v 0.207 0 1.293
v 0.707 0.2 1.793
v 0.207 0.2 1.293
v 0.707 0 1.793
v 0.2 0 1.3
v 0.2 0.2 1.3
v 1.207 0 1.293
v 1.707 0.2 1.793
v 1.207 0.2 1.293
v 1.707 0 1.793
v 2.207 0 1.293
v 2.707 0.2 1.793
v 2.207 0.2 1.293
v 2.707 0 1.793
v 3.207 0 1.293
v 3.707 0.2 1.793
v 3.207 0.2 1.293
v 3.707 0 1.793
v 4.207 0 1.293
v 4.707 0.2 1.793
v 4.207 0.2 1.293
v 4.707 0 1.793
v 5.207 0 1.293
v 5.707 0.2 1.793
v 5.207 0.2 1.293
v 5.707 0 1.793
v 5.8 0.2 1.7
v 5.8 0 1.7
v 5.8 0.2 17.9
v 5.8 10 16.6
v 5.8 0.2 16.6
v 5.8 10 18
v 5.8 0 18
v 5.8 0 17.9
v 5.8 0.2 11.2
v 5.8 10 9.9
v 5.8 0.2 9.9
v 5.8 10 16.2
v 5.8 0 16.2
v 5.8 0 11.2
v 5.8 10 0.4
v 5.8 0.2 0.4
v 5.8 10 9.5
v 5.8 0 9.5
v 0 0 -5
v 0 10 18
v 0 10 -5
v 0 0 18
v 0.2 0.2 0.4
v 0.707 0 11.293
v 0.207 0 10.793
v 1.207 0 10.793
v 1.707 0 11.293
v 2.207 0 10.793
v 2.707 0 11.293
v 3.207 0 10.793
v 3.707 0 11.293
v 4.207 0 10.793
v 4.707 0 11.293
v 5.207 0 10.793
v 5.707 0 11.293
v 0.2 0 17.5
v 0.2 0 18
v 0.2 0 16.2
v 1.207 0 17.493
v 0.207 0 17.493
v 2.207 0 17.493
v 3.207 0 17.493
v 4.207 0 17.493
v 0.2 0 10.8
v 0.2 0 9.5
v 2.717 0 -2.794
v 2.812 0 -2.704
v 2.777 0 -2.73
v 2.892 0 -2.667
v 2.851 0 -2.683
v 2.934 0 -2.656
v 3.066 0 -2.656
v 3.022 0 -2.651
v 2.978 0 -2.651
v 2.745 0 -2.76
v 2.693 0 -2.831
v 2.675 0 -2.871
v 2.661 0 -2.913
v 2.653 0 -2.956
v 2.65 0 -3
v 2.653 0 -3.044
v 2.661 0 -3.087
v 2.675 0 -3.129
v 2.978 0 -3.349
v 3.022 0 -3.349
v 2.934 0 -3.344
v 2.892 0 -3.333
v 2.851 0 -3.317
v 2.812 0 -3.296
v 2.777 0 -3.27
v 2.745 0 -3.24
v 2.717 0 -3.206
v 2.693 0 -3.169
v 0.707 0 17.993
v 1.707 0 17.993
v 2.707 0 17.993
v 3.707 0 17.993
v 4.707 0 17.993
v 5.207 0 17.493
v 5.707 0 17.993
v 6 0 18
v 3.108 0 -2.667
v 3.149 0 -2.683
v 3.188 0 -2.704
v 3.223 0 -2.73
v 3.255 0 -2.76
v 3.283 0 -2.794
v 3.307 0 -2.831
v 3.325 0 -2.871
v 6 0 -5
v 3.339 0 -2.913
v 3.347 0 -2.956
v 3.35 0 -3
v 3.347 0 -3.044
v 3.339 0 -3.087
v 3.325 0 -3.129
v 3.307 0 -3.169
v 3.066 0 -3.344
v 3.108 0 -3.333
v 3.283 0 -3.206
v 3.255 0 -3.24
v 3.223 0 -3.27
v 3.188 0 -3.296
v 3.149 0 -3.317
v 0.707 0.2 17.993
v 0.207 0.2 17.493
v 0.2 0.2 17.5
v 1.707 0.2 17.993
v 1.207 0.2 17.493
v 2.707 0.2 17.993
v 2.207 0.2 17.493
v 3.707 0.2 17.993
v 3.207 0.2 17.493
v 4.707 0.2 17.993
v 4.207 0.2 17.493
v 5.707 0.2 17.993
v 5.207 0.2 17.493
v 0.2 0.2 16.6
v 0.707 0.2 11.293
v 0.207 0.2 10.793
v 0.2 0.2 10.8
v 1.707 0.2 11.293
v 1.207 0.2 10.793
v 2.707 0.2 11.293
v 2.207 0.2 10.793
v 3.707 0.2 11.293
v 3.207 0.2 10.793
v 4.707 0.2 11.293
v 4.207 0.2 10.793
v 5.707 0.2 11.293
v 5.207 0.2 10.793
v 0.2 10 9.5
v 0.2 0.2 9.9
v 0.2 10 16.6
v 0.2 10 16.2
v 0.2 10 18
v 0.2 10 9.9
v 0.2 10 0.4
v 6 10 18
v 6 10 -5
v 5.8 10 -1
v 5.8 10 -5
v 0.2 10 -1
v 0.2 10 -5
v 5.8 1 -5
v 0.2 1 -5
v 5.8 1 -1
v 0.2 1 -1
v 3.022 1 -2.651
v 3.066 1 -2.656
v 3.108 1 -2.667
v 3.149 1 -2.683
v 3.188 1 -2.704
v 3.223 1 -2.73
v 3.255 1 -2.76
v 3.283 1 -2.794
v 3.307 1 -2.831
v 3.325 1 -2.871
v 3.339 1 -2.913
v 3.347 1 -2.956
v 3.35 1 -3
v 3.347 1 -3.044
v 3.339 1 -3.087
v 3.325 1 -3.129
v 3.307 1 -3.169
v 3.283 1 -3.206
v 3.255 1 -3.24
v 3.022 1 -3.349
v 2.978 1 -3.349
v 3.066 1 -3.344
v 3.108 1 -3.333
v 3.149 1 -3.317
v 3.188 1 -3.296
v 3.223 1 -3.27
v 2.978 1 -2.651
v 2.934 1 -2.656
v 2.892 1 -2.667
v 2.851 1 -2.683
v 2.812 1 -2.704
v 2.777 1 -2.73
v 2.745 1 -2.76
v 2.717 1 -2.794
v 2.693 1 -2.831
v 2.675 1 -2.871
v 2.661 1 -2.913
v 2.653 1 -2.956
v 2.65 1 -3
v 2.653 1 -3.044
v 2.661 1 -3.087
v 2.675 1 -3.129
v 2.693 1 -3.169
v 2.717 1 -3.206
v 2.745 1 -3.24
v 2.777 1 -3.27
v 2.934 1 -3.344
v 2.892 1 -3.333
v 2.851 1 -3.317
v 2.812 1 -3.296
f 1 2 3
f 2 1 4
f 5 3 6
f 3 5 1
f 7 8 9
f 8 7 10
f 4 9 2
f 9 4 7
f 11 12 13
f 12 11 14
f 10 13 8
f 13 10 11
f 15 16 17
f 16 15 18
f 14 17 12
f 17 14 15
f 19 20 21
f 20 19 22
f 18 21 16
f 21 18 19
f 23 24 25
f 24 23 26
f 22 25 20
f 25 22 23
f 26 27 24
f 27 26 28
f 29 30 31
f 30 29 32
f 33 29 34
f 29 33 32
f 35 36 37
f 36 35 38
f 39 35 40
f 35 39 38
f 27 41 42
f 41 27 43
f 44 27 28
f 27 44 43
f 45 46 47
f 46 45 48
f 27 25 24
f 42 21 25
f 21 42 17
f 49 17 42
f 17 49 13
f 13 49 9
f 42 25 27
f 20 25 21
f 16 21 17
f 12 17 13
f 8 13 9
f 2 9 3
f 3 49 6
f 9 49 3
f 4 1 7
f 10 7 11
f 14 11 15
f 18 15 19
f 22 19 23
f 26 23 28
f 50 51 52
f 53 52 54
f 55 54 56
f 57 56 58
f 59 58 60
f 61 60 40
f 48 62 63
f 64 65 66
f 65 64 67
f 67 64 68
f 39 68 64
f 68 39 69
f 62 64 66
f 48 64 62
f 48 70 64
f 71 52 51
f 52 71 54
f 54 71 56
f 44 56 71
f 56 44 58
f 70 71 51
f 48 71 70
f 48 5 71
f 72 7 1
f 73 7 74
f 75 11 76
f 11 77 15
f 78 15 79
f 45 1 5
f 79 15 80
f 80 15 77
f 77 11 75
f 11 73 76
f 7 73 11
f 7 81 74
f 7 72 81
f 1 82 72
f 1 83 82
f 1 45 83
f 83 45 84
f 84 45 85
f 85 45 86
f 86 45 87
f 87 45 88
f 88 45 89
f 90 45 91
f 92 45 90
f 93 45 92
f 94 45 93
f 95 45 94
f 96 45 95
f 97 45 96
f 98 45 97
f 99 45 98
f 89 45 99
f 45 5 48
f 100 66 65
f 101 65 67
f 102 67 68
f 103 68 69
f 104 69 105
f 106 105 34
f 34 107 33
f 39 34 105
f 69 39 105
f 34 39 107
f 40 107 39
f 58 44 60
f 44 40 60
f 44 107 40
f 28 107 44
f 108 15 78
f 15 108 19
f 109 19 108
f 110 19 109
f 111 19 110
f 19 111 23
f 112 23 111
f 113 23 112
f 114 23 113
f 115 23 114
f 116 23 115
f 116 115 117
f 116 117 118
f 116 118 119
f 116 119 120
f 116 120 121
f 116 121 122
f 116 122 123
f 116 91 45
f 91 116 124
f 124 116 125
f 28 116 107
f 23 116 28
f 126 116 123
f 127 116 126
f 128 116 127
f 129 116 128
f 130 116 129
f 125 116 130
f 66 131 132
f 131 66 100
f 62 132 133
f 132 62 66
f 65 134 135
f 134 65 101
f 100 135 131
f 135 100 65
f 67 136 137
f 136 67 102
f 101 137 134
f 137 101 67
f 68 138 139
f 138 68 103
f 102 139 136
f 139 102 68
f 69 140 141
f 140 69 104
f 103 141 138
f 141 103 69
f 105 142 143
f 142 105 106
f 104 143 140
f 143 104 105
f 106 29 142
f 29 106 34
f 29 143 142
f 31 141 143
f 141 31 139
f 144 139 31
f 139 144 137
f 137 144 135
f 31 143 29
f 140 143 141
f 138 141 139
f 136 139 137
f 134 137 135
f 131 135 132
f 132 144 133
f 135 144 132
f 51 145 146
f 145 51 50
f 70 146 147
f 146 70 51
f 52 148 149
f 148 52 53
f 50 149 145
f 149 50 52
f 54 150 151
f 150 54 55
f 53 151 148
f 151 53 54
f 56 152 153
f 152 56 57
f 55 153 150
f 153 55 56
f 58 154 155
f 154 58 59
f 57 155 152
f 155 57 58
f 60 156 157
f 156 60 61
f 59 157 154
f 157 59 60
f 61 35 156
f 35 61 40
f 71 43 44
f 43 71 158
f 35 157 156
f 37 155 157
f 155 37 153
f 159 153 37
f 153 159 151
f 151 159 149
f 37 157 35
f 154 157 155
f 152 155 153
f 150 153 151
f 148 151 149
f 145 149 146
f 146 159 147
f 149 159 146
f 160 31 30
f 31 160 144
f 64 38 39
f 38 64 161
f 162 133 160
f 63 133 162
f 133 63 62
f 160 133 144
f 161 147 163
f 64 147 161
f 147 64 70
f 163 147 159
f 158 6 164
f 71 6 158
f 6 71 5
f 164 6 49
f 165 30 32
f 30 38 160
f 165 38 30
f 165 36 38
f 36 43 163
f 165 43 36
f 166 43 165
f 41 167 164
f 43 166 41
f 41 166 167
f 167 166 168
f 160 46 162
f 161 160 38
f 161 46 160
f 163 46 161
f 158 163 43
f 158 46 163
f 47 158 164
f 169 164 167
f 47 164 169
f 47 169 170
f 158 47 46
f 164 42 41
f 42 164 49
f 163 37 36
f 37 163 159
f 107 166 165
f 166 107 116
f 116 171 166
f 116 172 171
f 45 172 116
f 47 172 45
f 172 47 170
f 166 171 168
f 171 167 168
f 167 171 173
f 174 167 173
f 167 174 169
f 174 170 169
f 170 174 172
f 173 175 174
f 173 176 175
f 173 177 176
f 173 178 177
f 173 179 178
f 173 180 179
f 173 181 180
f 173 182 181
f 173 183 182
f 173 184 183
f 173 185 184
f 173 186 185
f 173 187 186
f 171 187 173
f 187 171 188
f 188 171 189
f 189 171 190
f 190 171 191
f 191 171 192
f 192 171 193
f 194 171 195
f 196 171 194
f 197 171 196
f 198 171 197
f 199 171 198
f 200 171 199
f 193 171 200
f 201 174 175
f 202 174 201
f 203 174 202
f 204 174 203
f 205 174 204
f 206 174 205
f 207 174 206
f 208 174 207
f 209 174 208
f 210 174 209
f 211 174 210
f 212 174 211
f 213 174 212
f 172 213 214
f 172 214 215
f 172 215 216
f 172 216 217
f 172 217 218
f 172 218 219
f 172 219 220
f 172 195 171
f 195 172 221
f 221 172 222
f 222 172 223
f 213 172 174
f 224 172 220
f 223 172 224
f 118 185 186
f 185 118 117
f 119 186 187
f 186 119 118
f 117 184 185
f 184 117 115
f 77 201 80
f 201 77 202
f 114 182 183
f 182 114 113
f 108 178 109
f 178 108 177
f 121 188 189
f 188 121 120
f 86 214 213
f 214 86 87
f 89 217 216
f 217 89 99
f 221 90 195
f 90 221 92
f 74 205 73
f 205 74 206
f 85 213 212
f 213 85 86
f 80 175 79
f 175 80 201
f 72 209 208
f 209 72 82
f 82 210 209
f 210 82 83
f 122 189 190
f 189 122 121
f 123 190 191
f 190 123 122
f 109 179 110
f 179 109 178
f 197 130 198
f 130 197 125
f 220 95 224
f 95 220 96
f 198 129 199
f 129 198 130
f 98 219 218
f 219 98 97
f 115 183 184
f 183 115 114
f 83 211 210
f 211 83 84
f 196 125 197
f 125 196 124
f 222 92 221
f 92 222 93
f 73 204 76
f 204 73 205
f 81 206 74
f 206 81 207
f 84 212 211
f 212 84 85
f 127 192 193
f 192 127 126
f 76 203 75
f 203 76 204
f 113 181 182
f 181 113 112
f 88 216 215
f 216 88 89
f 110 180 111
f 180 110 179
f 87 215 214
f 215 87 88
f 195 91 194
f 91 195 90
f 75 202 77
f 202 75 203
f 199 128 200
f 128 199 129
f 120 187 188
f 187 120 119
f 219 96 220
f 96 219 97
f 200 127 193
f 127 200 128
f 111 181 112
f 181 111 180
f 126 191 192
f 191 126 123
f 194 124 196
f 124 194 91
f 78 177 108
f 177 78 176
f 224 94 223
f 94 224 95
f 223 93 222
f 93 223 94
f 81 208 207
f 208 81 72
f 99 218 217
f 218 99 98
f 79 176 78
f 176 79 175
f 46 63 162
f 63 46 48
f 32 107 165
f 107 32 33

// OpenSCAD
$fn=50;
h_top = 8.5;
h_bottom = 9.5;
n_blocks = 13;
depth = 10;
//                Top of of the cathedral
// <----------------------------------------------------


floor_thickness = 4;
cathedral_width = 5.6;

//                Height of the Red Book

wall_thickness = 0.2;
module floor_decor() {
  difference() {
    cube([wall_thickness + cathedral_width, 0.2, 2.0]);
    for(i=[0:6]) { translate([-0.5 + i,-0.2,2.0]) rotate([0,45,0]) cube([1,1,1]);}
  }
}
module floors() {
  translate([wall_thickness,0, h_bottom+h_top-1.8]) cube([cathedral_width,depth,.4]);
  translate([0,0,h_bottom+h_top-1.8]) floor_decor();
  cube([wall_thickness + cathedral_width,depth,.4]);
  translate([wall_thickness,0, h_bottom]) cube([cathedral_width,depth,.4]);
  translate([0,0,h_bottom]) floor_decor();
  cube([wall_thickness + cathedral_width,depth,.4]);
  floor_decor();
}

floors();

// <---------------------------------------------------




cm_per_block = h_bottom/n_blocks;
cube([wall_thickness, 10, h_bottom+h_top]);
translate([cathedral_width + wall_thickness ,0,0])
  cube([wall_thickness, 10, h_bottom+h_top]);
// ==========

//
//     Motor Housing
//

housing_height = 5;
hole_height = 2;
difference() {
translate([0,0, -housing_height]) cube([cathedral_width + wall_thickness * 2 ,depth, housing_height]);
translate([wall_thickness,1, -housing_height-1]) cube([cathedral_width,depth, housing_height]);
translate([wall_thickness + cathedral_width/2, 0, -housing_height + hole_height]) rotate([90,0,0]) cylinder(h=20, d=0.7, center=true);
}
